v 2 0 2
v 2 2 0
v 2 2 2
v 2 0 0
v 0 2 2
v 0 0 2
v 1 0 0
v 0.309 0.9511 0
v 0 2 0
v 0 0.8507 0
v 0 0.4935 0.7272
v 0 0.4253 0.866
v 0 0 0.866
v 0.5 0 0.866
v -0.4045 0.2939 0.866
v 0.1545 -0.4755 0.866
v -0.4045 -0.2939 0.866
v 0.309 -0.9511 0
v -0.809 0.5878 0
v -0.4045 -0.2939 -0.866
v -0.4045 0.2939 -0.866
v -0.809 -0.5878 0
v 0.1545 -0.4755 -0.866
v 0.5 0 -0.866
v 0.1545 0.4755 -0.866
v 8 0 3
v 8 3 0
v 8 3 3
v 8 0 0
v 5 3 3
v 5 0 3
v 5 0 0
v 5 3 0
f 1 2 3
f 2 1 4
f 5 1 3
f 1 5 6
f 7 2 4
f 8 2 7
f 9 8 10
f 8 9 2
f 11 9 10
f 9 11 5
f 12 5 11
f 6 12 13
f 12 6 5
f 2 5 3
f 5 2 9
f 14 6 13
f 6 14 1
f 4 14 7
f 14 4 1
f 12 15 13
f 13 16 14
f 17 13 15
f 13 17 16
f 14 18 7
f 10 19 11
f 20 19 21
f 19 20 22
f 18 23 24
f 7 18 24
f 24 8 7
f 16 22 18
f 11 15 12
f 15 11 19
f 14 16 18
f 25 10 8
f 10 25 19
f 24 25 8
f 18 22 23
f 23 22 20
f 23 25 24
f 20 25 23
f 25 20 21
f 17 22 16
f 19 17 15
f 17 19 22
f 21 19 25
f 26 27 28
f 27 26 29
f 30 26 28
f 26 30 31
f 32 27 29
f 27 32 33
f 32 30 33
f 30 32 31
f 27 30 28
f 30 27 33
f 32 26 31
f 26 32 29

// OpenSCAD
union() {
    cube(2);
    sphere(1);
    translate([5,0,0]) cube(3);
}
